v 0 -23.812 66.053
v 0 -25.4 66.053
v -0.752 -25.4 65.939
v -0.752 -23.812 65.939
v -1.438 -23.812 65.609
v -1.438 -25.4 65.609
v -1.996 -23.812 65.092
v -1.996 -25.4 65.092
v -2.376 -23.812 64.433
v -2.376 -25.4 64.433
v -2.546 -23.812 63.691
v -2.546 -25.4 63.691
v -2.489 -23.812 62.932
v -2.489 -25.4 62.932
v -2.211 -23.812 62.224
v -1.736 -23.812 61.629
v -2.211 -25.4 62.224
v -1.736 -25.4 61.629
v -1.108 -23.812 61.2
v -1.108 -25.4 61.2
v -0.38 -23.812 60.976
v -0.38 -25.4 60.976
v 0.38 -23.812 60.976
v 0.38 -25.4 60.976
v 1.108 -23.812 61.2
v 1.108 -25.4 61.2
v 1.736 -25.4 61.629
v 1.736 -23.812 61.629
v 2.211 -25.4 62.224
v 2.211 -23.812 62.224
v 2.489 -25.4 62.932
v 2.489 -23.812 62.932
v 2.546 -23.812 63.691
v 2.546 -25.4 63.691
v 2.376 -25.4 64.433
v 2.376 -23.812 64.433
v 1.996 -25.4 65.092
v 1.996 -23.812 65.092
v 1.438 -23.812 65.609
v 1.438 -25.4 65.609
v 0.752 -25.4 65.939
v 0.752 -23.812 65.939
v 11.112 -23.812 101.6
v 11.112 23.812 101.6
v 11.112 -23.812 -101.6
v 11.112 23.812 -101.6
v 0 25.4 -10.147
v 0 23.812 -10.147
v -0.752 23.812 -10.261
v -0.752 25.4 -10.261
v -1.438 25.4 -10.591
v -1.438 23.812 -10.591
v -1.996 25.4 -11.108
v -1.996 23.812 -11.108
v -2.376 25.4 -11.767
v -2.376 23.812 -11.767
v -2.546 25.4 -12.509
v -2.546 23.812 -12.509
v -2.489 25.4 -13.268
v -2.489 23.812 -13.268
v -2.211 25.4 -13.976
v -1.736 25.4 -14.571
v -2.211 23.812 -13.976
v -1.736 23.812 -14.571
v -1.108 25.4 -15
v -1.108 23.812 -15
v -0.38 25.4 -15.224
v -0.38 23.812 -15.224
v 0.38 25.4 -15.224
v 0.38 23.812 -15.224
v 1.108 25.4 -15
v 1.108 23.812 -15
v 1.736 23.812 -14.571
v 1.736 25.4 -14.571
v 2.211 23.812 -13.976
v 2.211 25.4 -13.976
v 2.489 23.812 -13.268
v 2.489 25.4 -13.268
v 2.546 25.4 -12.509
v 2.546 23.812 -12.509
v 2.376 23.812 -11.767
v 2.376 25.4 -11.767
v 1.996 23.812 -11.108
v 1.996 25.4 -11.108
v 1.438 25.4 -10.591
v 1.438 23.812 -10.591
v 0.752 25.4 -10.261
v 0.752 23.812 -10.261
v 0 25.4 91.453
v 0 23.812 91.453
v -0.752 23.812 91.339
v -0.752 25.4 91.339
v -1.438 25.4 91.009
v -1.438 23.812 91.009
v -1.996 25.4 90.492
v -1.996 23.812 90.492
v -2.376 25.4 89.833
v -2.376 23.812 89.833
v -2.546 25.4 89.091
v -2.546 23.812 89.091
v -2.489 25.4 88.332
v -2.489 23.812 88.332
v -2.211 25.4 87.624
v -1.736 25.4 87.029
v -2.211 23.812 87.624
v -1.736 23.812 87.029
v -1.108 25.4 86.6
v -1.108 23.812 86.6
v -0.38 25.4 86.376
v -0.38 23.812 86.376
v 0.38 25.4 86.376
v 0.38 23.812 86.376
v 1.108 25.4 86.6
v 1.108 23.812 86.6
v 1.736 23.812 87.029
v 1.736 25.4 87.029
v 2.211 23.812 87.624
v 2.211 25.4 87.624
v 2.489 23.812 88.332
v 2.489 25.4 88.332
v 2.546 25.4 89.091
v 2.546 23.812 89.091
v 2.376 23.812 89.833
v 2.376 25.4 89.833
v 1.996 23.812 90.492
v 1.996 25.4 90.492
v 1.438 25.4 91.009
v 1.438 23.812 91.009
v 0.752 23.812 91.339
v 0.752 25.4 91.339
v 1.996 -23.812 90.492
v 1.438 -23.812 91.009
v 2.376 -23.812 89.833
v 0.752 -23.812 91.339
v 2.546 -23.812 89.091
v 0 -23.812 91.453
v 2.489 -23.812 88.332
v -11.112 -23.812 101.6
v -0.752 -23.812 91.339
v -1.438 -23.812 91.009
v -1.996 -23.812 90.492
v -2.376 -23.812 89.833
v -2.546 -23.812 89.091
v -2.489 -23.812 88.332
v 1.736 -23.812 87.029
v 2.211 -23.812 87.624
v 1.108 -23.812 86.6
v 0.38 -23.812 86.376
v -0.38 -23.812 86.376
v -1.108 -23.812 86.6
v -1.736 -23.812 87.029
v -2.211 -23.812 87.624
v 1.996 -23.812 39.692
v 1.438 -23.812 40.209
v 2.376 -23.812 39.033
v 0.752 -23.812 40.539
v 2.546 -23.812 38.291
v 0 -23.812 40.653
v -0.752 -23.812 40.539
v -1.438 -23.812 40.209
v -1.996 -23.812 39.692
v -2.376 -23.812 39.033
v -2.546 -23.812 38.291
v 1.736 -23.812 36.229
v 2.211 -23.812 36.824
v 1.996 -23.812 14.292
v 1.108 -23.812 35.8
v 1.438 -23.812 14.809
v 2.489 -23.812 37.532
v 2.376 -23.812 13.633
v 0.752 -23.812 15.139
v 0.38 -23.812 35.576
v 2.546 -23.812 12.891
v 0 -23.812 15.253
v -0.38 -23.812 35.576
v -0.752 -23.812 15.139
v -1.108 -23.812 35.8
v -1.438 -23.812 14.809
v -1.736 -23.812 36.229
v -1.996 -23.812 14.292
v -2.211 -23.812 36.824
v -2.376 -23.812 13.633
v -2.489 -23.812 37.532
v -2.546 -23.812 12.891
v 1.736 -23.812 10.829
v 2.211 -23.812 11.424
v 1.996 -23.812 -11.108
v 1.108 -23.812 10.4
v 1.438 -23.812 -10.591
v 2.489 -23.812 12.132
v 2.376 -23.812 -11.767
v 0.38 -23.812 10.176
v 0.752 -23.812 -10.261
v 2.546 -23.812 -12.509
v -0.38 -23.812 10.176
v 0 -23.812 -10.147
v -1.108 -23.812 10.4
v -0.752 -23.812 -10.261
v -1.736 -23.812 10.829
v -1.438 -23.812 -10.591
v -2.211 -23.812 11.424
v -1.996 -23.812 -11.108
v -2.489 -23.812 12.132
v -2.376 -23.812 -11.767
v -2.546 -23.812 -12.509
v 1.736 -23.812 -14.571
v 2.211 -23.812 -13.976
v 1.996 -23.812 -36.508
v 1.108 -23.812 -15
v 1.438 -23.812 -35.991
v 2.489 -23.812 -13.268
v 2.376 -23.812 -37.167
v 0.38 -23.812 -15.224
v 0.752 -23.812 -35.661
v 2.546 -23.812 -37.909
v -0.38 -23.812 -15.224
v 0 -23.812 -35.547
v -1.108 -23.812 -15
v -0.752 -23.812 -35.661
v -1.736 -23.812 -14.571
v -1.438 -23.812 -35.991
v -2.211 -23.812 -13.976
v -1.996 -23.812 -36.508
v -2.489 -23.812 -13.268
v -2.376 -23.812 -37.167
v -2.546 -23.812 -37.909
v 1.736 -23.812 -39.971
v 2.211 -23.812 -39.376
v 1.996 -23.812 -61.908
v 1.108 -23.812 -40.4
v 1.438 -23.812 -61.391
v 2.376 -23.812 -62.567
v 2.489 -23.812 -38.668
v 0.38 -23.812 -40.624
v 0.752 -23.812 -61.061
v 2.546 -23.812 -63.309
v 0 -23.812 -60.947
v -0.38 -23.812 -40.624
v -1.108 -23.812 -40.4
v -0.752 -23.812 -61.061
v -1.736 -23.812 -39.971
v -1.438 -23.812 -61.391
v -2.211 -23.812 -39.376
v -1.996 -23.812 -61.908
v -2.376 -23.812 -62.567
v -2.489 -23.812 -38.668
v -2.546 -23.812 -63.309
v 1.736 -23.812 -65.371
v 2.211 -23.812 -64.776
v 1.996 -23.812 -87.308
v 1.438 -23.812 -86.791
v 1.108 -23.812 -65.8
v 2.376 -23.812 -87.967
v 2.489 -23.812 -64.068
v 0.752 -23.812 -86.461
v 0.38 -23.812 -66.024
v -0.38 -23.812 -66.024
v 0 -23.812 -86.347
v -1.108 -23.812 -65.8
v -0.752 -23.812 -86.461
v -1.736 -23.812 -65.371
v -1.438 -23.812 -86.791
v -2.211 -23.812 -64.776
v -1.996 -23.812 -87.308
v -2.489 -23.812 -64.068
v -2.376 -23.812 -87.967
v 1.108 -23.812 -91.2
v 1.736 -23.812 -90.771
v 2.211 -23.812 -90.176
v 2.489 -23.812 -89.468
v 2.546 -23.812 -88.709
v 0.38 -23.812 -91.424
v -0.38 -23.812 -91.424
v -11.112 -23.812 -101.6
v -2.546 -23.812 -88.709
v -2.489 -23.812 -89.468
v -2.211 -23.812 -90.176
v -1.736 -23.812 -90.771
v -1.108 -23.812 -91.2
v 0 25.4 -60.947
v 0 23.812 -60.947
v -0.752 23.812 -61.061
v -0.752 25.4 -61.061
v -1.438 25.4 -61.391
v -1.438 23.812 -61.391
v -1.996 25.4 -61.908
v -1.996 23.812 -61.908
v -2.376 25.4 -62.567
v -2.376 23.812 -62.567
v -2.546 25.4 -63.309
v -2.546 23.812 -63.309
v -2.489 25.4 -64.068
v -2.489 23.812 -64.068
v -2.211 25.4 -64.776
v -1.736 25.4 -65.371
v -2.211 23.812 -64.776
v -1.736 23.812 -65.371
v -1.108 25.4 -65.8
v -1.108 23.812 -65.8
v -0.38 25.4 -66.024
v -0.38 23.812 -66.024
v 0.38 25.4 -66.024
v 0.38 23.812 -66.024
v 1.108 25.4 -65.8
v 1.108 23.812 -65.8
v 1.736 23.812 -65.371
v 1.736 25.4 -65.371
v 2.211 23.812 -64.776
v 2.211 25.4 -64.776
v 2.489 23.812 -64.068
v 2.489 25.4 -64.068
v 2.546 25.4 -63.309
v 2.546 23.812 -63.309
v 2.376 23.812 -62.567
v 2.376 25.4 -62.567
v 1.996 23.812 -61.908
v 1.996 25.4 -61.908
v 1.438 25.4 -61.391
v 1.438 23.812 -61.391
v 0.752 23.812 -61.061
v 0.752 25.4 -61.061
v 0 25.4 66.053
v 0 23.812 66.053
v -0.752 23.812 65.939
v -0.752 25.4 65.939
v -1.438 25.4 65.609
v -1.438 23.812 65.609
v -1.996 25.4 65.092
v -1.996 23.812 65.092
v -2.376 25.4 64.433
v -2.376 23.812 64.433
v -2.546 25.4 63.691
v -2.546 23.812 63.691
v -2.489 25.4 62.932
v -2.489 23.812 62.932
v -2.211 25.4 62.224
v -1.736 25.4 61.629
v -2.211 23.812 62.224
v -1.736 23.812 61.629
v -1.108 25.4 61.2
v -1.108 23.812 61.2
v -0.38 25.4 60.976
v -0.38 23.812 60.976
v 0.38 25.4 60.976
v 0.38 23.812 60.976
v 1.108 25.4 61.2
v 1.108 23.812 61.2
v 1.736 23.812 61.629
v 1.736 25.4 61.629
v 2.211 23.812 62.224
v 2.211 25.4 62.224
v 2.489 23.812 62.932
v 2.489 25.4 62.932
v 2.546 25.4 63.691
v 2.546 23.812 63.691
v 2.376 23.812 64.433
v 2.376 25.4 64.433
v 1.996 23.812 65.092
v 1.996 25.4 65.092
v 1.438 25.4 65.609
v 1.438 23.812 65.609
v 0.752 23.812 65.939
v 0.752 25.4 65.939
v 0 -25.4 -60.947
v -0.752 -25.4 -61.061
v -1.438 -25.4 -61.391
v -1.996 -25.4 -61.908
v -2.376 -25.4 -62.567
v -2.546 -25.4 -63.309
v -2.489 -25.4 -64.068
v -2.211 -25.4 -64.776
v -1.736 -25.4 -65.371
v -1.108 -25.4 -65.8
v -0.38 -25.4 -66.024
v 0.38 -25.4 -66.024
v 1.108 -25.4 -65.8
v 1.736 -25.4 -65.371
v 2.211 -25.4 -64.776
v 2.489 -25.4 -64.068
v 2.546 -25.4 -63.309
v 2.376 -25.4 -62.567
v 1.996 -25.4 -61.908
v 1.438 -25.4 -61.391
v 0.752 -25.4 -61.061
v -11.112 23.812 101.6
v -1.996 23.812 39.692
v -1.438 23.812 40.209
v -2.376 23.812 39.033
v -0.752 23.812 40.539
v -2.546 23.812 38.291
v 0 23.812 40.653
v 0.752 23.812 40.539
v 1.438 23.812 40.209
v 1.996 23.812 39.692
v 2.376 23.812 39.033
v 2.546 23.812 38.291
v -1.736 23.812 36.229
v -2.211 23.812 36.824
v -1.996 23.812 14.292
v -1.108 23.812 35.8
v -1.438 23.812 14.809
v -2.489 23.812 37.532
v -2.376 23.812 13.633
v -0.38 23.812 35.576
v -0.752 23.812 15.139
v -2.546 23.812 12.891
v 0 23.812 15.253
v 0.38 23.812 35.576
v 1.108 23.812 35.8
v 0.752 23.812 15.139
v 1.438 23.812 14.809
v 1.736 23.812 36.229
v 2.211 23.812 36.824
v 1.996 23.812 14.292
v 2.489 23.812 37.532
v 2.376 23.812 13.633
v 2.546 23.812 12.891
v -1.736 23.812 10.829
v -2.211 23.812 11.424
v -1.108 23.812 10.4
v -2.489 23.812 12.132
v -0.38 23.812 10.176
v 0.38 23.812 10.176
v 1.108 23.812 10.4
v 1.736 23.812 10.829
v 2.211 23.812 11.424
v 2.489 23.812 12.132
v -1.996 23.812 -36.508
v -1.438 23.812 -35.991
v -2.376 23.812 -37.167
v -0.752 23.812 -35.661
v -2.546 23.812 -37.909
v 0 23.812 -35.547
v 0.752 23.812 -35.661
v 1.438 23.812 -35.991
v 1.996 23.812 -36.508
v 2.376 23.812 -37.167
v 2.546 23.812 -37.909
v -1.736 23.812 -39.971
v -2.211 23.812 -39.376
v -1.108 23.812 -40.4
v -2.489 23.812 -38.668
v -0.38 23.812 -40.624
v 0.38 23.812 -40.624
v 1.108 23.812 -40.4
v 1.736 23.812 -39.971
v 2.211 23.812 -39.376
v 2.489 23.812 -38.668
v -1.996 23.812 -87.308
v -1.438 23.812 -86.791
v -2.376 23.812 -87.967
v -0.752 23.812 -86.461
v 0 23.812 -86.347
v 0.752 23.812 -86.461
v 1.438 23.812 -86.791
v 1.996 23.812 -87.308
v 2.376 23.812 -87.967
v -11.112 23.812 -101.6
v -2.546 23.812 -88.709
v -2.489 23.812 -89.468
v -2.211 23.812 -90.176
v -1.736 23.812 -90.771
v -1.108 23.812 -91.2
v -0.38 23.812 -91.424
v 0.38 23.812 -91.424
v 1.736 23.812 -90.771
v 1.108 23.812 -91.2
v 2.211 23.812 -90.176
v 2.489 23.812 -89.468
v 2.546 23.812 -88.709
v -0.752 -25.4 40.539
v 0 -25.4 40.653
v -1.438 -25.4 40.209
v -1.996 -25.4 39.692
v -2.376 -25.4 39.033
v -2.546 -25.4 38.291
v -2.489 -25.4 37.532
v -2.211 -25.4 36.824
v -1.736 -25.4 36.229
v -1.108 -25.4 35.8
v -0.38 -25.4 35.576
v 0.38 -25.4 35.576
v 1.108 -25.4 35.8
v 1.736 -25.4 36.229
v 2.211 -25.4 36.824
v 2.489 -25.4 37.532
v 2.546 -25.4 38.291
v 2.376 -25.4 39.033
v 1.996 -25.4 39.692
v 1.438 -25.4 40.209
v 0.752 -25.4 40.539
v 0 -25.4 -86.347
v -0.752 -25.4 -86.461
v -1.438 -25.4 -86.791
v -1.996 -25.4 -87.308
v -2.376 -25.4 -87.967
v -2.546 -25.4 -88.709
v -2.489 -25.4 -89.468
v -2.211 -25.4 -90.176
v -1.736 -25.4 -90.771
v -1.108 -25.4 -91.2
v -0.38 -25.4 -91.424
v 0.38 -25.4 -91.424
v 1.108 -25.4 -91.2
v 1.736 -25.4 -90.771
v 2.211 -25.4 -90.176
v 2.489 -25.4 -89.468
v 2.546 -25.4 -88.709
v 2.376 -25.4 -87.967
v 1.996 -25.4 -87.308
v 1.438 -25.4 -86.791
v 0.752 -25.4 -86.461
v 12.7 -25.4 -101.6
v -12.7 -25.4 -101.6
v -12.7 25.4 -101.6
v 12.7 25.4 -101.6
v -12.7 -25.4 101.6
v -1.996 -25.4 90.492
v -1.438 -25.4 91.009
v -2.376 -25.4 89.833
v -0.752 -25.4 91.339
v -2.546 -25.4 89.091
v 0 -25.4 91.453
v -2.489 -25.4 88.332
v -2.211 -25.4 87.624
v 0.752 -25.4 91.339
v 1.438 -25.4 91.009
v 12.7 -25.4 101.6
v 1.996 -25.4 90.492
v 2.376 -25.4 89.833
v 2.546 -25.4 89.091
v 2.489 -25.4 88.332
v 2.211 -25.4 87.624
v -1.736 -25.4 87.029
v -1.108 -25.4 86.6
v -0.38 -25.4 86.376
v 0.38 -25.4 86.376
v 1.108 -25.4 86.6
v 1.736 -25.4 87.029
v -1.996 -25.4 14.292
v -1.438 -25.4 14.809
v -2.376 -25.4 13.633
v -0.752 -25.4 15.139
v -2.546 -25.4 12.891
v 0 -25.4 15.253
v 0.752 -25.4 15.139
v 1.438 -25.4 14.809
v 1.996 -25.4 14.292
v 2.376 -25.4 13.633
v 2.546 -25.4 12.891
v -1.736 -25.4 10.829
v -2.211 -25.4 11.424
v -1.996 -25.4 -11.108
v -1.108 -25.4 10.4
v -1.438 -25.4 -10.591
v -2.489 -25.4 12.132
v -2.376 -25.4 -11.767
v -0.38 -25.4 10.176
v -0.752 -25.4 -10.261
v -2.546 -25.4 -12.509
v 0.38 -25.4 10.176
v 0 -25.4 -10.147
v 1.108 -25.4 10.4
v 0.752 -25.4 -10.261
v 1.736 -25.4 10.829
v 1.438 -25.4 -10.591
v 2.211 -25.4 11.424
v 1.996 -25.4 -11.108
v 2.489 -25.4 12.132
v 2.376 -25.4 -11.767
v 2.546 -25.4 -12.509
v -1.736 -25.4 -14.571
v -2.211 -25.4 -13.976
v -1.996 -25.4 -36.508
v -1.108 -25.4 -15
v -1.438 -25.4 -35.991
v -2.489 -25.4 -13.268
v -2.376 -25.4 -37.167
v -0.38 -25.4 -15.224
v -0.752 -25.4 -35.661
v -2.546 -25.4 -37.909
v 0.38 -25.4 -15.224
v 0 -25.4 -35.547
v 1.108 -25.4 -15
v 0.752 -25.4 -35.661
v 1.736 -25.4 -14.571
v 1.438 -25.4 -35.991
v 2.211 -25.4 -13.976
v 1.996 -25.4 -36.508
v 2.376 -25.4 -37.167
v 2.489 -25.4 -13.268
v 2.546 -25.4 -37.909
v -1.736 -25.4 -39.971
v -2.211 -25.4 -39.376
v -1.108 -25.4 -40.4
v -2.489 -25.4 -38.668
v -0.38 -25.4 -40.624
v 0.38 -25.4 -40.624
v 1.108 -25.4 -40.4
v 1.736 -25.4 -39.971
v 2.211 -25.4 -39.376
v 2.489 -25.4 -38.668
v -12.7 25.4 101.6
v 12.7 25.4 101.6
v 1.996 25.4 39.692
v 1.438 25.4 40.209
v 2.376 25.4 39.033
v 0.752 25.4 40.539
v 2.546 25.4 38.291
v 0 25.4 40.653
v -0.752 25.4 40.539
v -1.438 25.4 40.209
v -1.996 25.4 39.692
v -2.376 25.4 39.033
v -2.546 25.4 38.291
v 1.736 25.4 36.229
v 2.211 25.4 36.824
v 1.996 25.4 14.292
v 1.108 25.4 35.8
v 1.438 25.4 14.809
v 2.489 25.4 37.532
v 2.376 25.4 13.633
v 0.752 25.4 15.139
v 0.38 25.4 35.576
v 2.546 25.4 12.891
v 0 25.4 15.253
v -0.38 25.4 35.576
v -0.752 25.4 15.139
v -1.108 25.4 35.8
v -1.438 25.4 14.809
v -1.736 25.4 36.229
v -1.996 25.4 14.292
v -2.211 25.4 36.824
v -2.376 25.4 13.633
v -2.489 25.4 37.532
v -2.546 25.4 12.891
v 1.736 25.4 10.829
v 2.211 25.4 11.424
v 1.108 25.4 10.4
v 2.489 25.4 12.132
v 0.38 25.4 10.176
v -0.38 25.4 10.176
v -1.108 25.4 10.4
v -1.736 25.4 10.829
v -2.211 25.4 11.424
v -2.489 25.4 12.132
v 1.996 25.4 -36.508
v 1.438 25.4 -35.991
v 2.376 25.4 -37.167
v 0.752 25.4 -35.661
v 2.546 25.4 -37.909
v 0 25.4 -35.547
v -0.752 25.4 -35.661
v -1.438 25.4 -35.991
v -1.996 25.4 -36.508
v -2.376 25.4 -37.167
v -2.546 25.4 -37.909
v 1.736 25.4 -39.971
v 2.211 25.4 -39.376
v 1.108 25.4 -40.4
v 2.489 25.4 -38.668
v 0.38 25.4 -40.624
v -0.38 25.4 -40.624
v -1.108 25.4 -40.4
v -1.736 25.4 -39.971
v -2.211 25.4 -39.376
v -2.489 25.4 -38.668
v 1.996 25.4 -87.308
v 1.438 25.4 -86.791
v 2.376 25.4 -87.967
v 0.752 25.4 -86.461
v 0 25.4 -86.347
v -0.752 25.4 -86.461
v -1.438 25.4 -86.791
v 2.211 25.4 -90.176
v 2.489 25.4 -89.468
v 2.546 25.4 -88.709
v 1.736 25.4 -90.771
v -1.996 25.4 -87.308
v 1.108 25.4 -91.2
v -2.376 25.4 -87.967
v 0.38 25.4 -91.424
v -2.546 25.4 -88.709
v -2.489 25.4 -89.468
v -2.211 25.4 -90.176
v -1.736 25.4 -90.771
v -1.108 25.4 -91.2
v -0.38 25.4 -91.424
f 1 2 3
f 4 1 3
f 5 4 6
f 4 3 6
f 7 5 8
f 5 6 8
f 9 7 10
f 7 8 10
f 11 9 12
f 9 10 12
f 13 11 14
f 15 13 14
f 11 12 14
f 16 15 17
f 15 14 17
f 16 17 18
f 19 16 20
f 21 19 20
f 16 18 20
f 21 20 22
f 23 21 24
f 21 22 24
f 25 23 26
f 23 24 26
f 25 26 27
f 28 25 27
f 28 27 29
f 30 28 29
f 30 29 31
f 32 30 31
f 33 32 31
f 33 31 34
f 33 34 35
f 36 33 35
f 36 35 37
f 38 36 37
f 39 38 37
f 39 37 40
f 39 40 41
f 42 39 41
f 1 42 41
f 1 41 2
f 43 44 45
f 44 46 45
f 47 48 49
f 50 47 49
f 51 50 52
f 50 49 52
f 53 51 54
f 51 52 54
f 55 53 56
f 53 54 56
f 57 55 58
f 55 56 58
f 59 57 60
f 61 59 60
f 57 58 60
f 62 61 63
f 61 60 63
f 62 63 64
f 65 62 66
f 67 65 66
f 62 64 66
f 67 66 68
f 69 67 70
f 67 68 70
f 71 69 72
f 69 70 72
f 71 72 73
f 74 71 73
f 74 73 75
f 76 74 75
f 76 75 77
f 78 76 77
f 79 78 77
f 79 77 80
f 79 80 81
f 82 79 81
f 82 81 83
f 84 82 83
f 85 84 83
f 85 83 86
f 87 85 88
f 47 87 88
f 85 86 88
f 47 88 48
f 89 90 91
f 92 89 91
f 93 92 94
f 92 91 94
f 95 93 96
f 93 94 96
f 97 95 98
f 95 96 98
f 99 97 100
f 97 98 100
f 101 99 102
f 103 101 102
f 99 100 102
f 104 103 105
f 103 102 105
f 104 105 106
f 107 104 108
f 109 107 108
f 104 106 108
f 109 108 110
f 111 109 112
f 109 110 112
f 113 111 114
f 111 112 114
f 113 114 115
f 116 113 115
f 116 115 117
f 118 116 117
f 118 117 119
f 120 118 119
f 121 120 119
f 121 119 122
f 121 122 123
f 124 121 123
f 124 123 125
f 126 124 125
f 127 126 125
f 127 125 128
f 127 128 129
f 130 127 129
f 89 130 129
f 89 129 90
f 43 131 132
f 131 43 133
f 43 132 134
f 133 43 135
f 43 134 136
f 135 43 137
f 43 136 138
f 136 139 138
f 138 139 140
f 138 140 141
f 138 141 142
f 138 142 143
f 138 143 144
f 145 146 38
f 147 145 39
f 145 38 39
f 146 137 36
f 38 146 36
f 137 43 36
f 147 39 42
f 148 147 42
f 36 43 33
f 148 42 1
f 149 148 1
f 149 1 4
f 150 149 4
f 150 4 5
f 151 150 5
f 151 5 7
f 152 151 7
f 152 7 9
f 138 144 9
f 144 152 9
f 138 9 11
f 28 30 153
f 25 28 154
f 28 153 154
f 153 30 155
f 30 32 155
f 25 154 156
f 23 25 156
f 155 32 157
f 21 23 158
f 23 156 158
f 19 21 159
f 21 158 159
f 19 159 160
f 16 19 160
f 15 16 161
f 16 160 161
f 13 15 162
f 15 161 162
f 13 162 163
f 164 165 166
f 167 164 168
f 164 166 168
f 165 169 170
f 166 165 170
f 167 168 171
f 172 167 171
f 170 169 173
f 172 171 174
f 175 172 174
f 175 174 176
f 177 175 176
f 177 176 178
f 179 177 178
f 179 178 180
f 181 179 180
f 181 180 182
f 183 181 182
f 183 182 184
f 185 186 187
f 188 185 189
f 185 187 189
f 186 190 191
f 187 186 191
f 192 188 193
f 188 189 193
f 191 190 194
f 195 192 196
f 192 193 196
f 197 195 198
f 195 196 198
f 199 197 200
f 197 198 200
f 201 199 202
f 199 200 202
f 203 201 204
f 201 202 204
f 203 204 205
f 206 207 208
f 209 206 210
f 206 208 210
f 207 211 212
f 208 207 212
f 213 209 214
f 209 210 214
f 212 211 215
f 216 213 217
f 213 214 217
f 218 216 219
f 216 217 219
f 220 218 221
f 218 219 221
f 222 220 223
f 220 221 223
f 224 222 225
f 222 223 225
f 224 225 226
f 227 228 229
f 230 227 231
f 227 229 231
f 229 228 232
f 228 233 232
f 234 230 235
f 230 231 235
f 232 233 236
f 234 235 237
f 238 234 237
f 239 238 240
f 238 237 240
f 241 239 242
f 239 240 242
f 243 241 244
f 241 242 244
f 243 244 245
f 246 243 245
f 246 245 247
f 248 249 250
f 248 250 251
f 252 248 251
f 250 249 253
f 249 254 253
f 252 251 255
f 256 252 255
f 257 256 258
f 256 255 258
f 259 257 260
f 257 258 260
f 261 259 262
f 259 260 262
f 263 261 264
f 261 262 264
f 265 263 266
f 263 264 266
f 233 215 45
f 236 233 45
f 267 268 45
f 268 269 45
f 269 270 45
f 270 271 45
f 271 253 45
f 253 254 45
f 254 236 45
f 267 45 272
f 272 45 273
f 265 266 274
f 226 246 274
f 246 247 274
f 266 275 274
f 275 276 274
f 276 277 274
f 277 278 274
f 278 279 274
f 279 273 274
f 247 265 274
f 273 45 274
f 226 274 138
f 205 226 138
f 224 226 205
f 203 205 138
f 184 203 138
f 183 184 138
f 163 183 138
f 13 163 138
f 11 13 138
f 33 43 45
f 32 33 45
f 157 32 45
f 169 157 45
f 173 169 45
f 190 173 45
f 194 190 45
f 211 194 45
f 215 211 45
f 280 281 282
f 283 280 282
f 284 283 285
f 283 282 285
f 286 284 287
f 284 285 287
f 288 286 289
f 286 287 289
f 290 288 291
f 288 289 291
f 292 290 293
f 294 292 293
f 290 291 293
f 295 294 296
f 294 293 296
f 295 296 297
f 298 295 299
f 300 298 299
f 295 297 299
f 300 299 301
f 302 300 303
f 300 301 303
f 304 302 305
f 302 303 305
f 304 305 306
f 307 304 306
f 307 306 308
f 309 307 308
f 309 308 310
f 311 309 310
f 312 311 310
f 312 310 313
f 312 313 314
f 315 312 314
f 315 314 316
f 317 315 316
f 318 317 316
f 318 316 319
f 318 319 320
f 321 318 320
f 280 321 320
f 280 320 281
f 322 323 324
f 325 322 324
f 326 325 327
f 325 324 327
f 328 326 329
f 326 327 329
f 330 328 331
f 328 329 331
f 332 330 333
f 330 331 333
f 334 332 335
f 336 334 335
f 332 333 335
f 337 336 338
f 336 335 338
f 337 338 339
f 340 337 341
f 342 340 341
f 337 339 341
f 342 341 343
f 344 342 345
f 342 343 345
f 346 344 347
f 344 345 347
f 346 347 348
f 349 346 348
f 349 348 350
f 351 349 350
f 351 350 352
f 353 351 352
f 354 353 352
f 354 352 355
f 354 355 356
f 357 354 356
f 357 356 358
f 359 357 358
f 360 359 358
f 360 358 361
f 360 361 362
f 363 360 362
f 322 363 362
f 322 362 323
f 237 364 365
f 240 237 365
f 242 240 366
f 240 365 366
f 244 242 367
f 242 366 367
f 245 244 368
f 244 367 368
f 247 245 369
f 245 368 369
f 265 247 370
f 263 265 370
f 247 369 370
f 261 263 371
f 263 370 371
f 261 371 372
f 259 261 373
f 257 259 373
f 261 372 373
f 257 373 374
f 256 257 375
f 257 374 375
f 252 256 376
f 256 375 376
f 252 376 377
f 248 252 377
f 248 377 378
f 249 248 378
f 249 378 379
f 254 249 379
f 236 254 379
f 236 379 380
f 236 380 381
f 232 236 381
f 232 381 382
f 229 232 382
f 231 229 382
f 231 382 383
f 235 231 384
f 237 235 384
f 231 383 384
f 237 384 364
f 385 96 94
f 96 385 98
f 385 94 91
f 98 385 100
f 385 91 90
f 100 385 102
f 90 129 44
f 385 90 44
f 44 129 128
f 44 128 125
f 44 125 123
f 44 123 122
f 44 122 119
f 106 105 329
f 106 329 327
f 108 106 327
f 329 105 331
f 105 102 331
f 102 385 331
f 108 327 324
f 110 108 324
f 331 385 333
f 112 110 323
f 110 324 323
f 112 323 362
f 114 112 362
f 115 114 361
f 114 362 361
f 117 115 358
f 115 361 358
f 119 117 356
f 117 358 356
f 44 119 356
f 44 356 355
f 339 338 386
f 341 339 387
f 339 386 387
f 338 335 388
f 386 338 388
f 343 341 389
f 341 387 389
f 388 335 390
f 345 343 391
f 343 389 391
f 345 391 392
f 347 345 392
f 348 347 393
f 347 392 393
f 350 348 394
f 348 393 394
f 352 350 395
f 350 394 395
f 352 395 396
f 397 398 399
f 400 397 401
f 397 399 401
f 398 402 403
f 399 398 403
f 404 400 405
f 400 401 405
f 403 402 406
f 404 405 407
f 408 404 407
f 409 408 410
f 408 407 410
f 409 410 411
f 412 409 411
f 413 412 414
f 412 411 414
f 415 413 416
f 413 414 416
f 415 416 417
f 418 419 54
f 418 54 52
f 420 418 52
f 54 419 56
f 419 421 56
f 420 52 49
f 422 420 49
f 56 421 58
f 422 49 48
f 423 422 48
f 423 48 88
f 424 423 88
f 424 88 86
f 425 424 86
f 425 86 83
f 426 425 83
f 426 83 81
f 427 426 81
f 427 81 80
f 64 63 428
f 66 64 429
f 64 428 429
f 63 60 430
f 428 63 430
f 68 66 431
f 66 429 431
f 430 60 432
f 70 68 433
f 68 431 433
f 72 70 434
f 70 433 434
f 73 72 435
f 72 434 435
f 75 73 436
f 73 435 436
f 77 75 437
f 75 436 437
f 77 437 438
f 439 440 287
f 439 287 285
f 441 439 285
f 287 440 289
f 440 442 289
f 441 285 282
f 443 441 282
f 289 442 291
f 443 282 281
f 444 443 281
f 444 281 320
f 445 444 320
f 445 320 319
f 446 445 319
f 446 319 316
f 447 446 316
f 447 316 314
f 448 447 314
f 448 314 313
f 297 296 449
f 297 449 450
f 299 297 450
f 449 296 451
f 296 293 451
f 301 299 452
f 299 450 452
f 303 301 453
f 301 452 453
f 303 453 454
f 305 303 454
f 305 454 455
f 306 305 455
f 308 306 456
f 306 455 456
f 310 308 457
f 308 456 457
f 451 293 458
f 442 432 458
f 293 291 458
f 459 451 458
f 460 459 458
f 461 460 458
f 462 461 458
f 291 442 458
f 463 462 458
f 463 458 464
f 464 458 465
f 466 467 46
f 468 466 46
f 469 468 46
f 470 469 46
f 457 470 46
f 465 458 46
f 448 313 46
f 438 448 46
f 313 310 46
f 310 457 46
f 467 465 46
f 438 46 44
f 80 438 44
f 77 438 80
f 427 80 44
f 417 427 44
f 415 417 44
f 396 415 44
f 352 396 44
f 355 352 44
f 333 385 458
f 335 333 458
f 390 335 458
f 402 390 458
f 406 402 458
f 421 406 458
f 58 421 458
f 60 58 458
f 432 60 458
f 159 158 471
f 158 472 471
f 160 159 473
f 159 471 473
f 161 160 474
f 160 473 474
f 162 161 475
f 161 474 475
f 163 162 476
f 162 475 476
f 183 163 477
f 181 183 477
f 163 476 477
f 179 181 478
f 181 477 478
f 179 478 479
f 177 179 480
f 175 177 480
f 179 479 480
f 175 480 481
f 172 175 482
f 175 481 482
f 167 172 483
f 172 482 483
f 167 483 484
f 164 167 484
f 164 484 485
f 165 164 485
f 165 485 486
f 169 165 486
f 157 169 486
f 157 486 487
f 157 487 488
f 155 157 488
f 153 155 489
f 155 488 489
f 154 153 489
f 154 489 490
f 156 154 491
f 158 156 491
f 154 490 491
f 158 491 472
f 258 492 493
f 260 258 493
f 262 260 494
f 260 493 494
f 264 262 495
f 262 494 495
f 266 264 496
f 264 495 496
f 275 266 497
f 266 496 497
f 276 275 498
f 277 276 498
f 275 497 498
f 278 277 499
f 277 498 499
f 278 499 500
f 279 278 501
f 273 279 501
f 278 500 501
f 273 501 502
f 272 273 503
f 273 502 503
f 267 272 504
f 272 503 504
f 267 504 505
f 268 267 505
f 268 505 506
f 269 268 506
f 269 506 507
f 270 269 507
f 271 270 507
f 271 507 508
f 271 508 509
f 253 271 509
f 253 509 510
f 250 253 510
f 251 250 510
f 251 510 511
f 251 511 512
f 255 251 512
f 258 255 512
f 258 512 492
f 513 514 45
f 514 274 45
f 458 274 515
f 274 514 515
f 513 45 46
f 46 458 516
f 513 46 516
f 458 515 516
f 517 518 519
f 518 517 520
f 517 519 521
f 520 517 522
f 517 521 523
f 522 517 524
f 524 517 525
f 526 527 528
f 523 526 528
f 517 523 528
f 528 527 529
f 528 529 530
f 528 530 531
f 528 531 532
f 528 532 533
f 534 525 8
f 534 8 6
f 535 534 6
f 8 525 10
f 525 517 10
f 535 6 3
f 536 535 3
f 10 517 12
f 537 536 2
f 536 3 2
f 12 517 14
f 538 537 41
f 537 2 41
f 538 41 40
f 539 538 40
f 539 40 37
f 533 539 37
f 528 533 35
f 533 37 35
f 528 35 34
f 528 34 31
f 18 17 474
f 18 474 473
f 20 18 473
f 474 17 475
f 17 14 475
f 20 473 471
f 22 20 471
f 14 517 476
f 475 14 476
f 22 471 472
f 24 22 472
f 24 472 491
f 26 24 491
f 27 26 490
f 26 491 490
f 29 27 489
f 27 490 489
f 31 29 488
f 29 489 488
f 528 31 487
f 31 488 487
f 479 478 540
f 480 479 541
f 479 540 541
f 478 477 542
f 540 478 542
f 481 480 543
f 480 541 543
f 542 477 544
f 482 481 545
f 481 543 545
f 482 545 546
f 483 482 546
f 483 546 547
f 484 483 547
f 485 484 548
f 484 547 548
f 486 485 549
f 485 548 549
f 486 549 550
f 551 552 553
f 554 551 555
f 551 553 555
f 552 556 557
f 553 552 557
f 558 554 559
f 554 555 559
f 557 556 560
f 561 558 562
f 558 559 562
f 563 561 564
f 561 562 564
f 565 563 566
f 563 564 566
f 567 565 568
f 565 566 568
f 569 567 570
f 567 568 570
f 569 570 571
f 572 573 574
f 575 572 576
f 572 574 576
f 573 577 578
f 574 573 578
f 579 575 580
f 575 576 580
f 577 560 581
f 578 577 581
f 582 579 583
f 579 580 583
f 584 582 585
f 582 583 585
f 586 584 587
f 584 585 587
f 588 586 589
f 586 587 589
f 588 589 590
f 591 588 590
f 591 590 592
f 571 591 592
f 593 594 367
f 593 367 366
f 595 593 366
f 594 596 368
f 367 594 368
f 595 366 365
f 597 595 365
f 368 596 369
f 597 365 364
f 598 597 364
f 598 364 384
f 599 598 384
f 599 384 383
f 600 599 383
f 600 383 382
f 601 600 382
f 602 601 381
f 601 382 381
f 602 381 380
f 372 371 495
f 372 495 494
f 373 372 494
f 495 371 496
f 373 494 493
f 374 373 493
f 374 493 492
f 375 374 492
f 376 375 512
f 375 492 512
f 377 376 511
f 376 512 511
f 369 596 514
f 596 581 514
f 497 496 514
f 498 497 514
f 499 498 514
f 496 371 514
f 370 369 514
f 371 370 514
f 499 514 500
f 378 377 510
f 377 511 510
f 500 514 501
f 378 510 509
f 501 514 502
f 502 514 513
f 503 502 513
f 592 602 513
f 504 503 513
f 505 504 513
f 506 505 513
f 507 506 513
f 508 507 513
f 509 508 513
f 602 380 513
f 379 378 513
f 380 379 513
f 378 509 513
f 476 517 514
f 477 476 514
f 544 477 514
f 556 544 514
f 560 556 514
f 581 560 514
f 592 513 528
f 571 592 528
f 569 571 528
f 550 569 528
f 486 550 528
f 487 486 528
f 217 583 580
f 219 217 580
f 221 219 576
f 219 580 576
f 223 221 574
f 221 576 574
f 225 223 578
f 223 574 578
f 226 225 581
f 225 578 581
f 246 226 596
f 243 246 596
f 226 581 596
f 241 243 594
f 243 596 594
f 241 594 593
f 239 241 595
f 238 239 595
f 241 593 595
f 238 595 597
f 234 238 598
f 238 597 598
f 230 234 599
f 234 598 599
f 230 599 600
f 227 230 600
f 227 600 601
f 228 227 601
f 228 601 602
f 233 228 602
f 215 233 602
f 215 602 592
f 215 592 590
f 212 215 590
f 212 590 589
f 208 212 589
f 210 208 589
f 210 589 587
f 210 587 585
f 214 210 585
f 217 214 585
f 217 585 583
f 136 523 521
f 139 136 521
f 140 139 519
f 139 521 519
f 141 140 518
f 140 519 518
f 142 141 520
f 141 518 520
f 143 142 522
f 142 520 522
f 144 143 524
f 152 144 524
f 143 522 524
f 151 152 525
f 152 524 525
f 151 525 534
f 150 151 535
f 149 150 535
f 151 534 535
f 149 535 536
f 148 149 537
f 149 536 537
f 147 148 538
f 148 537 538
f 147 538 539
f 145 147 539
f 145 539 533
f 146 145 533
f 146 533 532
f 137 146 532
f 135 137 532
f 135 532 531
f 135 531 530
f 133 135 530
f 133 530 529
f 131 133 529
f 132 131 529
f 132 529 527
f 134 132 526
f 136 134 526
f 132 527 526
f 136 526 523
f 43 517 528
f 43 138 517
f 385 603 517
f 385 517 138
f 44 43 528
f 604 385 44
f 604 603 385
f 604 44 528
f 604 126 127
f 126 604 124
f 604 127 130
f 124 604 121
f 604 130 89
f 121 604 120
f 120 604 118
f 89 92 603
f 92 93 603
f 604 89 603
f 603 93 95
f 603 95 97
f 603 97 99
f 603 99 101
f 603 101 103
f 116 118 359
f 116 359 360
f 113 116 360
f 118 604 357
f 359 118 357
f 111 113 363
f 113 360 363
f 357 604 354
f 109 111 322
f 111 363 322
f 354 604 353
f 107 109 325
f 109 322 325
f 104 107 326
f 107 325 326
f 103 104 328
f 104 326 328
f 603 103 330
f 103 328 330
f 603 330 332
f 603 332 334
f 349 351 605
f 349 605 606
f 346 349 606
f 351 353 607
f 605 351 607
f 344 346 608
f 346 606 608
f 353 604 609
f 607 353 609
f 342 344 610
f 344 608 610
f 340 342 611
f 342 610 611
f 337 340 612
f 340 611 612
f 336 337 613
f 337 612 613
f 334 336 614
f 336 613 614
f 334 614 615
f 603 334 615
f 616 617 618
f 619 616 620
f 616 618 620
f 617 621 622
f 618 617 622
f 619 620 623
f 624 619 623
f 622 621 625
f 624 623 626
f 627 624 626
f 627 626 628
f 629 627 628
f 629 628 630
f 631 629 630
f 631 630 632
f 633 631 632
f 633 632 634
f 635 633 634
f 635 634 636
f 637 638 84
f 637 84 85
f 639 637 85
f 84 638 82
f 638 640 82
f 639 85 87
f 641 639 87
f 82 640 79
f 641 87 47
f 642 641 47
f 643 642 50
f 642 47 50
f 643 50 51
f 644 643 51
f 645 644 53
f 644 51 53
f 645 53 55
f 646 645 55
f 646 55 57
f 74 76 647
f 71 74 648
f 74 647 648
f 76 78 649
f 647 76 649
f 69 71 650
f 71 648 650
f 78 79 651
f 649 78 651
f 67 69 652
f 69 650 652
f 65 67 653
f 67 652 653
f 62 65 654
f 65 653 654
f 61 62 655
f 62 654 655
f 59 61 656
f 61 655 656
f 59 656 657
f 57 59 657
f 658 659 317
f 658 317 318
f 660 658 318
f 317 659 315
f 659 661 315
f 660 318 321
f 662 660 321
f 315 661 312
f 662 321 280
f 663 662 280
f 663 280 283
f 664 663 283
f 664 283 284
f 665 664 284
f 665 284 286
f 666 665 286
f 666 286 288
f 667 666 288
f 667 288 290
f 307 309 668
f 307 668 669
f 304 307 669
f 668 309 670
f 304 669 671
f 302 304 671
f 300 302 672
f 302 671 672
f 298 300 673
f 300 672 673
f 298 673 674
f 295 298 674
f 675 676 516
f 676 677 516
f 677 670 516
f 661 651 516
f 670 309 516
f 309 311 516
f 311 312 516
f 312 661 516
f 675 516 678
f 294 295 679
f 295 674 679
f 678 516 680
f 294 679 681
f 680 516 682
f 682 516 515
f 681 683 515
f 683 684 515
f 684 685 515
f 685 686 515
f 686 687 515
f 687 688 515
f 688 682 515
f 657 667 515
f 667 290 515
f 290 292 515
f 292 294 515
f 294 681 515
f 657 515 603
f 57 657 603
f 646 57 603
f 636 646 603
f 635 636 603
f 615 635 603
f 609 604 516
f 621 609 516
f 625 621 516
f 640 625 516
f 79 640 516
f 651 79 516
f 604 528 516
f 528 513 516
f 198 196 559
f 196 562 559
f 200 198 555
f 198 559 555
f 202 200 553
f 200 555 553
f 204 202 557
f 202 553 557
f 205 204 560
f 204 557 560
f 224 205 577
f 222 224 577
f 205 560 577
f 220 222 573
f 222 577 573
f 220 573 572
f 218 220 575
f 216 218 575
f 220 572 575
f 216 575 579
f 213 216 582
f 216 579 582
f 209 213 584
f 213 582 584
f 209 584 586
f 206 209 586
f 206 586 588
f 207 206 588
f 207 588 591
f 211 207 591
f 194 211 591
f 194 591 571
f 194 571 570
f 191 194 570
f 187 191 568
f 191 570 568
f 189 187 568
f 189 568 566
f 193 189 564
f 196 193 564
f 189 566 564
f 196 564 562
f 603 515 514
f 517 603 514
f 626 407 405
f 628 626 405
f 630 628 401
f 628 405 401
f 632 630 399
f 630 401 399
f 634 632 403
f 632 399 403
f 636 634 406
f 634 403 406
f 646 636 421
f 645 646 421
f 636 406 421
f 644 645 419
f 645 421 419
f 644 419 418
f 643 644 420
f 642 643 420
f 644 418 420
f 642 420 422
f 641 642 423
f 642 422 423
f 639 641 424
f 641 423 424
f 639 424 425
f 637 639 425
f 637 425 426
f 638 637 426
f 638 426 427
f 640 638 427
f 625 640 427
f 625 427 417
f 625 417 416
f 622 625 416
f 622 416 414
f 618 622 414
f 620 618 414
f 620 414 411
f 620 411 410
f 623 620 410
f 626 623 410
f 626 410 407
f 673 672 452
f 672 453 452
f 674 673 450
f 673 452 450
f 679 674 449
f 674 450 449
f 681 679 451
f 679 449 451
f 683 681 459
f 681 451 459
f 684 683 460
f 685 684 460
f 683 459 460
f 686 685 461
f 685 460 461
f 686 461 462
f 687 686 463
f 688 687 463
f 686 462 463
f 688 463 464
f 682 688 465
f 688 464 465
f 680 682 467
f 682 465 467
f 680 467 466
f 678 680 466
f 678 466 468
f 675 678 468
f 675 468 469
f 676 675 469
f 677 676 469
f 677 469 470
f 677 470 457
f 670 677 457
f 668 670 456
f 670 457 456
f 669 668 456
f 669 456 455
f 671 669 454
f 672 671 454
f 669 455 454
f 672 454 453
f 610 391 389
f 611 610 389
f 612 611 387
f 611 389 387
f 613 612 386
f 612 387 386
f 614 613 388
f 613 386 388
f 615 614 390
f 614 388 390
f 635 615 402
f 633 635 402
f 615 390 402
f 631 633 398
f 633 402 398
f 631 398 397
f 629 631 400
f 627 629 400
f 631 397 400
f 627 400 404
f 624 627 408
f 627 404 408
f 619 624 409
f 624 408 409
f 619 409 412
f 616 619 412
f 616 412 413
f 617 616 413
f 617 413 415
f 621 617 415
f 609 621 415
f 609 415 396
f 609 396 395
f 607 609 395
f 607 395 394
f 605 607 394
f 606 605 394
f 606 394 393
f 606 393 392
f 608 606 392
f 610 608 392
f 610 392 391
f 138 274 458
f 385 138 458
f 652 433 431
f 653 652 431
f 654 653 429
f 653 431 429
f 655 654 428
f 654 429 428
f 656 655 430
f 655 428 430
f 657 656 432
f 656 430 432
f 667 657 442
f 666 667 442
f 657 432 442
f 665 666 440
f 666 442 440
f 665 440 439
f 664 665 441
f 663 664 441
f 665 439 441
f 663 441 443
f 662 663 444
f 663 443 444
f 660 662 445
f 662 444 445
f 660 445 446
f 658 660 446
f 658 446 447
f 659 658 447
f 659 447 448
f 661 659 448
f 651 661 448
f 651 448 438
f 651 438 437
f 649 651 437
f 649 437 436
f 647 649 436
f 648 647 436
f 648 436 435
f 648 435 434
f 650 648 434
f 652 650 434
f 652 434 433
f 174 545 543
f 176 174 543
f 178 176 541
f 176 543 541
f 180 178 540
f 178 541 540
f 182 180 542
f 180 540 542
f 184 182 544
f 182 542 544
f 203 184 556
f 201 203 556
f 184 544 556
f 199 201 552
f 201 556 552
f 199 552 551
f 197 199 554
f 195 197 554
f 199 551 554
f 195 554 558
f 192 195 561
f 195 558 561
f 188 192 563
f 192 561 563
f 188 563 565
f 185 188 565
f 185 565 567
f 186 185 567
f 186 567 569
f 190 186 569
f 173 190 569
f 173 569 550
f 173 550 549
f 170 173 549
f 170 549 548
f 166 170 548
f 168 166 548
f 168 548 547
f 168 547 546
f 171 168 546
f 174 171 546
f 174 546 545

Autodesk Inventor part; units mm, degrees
ref_plane "YZ Plane" through (0, 0, 0) normal (1, 0, 0) x (0, 1, 0)
ref_plane "XZ Plane" through (0, 0, 0) normal (0, 1, 0) x (-1, 0, 0)
ref_plane "XY Plane" through (0, 0, 0) normal (0, 0, 1) x (1, 0, 0)
sketch "Sketch1" plane through (0, 0, 0) normal (0, 0, 1) x (1, 0, 0)
  line L0 (-12.7, -25.4) -> (12.7, -25.4)
  line L1 (12.7, -25.4) -> (12.7, 25.4)
  line L2 (12.7, 25.4) -> (-12.7, 25.4)
  line L3 (-12.7, 25.4) -> (-12.7, -25.4)
  line L4 (-12.7, -25.4) -> (12.7, 25.4) construction
  line L5 (12.7, -25.4) -> (-12.7, 25.4) construction
  line L6 (-11.1125, 23.8125) -> (11.1125, 23.8125)
  line L7 (11.1125, 23.8125) -> (11.1125, -23.8125)
  line L8 (11.1125, -23.8125) -> (-11.1125, -23.8125)
  line L9 (-11.1125, -23.8125) -> (-11.1125, 23.8125)
  point P0 (0, 0)
  dimension "width" = 25.4
  dimension "height" = 50.8
  dimension "thickness" = 1.5875
extrude "Extrusion1" add sketch "Sketch1" along normal mid plane 203.2
sketch "Sketch4" plane through (-12.7, 25.4, 101.6) normal (0, 1, 0) x (1, 0, 0)
  line L0 (0, 203.2) -> (25.4, 203.2) construction
  line L1 (25.4, 203.2) -> (25.4, 0) construction
  line L2 (25.4, 0) -> (0, 0) construction
  line L3 (0, 0) -> (0, 203.2) construction
  line L4 (25.4, 0) -> (0, 0)
  line L5 (0, 0) -> (25.4, 25.4)
  line L6 (25.4, 25.4) -> (25.4, 0)
  point P0 (12.7, 101.6)
  dimension "d13" = 45
extrude "Extrusion4" [suppressed]
sketch "Sketch5" plane through (-12.7, 25.4, 101.6) normal (0, 1, 0) x (1, 0, 0)
  line L0 (0, 203.2) -> (25.4, 203.2) construction
  line L1 (25.4, 203.2) -> (25.4, 0) construction
  line L2 (25.4, 0) -> (0, 0) construction
  line L3 (0, 0) -> (0, 203.2) construction
  point P0 (12.7, 101.6)
  point P1 (12.7, 190.5)
  point P2 (12.7, 203.2)
  dimension "d16" = 12.7
hole "Hole1" at (0, 25.4, -88.9) direction (0, -1, 0) diameter 5.1054 end through all clearance for "Flat Head Machine Screw (82)" size "#10" standard "Ansi Unified Screw Threads"
pattern_linear "Rectangular Pattern1" count 8 spacing 25.4 along (0, 0, 1) of "Hole1"
properties part number "CL3-002" material "Aluminum 6061"
